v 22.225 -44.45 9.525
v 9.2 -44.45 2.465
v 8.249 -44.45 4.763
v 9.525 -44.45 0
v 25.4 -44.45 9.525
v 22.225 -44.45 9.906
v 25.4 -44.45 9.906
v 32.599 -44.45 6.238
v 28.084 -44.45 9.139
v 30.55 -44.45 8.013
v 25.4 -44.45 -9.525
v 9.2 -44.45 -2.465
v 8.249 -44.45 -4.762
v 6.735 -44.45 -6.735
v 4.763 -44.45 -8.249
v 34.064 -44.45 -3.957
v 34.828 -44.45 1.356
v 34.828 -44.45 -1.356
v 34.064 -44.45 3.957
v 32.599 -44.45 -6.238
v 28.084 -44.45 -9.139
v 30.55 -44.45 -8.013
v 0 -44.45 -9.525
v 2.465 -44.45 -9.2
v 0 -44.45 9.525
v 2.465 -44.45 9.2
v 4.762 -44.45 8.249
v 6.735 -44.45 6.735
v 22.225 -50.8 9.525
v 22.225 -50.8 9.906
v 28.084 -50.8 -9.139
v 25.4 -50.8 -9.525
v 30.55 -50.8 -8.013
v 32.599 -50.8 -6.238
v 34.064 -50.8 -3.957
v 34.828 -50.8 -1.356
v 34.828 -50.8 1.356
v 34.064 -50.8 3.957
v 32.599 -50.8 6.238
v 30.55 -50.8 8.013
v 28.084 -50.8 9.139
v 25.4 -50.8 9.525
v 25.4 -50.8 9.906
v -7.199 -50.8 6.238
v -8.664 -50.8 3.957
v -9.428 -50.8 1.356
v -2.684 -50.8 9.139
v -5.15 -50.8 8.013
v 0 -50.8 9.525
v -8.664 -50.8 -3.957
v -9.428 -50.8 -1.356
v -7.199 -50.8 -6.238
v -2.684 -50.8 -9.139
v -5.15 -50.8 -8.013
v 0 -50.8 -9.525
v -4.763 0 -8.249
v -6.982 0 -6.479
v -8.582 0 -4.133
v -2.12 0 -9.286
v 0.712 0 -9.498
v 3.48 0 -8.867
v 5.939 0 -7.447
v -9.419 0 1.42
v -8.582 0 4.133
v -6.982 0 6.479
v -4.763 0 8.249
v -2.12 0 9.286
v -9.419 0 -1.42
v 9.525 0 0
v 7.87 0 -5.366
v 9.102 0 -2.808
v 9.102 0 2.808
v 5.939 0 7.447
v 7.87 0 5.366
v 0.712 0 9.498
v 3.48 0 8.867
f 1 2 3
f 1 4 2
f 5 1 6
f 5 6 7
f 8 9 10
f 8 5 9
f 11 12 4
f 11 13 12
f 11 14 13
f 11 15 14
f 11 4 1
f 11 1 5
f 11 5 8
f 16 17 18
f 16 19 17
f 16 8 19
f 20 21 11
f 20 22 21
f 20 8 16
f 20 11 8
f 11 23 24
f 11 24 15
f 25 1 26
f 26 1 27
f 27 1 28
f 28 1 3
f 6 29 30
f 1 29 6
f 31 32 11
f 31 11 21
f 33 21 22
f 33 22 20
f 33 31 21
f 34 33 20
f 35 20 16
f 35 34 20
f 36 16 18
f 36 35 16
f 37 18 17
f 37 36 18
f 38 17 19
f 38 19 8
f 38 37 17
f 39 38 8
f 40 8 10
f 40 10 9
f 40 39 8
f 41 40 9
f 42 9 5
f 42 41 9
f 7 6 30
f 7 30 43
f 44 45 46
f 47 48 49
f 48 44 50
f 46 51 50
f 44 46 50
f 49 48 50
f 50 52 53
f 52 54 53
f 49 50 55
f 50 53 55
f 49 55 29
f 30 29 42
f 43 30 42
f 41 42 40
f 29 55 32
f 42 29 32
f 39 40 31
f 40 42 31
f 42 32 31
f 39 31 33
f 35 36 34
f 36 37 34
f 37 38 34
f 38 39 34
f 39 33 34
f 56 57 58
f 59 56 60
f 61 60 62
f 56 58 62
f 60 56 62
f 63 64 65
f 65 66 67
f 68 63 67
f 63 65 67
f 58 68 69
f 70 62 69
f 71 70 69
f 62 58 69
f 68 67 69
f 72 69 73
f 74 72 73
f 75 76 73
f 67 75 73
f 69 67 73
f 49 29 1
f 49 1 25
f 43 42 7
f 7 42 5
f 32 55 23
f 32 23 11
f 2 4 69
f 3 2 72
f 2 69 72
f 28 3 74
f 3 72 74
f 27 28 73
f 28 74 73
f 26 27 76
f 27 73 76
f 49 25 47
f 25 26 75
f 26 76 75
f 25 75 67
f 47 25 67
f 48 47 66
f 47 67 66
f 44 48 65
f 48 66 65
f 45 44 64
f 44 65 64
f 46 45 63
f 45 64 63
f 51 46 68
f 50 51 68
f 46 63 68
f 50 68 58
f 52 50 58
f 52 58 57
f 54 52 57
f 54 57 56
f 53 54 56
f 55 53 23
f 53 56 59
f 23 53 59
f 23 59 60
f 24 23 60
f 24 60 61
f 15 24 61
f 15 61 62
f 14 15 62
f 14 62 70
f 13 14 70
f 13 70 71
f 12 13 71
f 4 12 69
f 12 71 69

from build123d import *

# Parameters (mm, degrees)
F0_R     = 9.525
F1_DEPTH = 50.8
F3_DEPTH = 6.35
F4_W     = 3.175
F4_H     = 6.35
F5_DEPTH = 0.381


with BuildPart() as f1:
    # F0 (on Front) → F1 (new body)
    with BuildSketch(Plane.XZ):
        Circle(F0_R)
    extrude(amount=F1_DEPTH)

    # F2 (on face) → F3 (join)
    with BuildSketch(Plane.XZ.offset(50.8)):
        with BuildLine():
            Line((0, -9.525), (25.4, -9.525))
            ThreePointArc((25.4, -9.525), (34.925, 0), (25.4, 9.525))
            Line((25.4, 9.525), (0, 9.525))
            ThreePointArc((0, 9.525), (9.525, 0), (0, -9.525))
        make_face()
    extrude(amount=-F3_DEPTH)

    # F4 (on face) → F5 (join)
    with BuildSketch(Plane.XY.offset(9.525)):
        with Locations((23.8125, -47.625)):
            Rectangle(F4_W, F4_H)
    extrude(amount=F5_DEPTH)


solid = f1.part
